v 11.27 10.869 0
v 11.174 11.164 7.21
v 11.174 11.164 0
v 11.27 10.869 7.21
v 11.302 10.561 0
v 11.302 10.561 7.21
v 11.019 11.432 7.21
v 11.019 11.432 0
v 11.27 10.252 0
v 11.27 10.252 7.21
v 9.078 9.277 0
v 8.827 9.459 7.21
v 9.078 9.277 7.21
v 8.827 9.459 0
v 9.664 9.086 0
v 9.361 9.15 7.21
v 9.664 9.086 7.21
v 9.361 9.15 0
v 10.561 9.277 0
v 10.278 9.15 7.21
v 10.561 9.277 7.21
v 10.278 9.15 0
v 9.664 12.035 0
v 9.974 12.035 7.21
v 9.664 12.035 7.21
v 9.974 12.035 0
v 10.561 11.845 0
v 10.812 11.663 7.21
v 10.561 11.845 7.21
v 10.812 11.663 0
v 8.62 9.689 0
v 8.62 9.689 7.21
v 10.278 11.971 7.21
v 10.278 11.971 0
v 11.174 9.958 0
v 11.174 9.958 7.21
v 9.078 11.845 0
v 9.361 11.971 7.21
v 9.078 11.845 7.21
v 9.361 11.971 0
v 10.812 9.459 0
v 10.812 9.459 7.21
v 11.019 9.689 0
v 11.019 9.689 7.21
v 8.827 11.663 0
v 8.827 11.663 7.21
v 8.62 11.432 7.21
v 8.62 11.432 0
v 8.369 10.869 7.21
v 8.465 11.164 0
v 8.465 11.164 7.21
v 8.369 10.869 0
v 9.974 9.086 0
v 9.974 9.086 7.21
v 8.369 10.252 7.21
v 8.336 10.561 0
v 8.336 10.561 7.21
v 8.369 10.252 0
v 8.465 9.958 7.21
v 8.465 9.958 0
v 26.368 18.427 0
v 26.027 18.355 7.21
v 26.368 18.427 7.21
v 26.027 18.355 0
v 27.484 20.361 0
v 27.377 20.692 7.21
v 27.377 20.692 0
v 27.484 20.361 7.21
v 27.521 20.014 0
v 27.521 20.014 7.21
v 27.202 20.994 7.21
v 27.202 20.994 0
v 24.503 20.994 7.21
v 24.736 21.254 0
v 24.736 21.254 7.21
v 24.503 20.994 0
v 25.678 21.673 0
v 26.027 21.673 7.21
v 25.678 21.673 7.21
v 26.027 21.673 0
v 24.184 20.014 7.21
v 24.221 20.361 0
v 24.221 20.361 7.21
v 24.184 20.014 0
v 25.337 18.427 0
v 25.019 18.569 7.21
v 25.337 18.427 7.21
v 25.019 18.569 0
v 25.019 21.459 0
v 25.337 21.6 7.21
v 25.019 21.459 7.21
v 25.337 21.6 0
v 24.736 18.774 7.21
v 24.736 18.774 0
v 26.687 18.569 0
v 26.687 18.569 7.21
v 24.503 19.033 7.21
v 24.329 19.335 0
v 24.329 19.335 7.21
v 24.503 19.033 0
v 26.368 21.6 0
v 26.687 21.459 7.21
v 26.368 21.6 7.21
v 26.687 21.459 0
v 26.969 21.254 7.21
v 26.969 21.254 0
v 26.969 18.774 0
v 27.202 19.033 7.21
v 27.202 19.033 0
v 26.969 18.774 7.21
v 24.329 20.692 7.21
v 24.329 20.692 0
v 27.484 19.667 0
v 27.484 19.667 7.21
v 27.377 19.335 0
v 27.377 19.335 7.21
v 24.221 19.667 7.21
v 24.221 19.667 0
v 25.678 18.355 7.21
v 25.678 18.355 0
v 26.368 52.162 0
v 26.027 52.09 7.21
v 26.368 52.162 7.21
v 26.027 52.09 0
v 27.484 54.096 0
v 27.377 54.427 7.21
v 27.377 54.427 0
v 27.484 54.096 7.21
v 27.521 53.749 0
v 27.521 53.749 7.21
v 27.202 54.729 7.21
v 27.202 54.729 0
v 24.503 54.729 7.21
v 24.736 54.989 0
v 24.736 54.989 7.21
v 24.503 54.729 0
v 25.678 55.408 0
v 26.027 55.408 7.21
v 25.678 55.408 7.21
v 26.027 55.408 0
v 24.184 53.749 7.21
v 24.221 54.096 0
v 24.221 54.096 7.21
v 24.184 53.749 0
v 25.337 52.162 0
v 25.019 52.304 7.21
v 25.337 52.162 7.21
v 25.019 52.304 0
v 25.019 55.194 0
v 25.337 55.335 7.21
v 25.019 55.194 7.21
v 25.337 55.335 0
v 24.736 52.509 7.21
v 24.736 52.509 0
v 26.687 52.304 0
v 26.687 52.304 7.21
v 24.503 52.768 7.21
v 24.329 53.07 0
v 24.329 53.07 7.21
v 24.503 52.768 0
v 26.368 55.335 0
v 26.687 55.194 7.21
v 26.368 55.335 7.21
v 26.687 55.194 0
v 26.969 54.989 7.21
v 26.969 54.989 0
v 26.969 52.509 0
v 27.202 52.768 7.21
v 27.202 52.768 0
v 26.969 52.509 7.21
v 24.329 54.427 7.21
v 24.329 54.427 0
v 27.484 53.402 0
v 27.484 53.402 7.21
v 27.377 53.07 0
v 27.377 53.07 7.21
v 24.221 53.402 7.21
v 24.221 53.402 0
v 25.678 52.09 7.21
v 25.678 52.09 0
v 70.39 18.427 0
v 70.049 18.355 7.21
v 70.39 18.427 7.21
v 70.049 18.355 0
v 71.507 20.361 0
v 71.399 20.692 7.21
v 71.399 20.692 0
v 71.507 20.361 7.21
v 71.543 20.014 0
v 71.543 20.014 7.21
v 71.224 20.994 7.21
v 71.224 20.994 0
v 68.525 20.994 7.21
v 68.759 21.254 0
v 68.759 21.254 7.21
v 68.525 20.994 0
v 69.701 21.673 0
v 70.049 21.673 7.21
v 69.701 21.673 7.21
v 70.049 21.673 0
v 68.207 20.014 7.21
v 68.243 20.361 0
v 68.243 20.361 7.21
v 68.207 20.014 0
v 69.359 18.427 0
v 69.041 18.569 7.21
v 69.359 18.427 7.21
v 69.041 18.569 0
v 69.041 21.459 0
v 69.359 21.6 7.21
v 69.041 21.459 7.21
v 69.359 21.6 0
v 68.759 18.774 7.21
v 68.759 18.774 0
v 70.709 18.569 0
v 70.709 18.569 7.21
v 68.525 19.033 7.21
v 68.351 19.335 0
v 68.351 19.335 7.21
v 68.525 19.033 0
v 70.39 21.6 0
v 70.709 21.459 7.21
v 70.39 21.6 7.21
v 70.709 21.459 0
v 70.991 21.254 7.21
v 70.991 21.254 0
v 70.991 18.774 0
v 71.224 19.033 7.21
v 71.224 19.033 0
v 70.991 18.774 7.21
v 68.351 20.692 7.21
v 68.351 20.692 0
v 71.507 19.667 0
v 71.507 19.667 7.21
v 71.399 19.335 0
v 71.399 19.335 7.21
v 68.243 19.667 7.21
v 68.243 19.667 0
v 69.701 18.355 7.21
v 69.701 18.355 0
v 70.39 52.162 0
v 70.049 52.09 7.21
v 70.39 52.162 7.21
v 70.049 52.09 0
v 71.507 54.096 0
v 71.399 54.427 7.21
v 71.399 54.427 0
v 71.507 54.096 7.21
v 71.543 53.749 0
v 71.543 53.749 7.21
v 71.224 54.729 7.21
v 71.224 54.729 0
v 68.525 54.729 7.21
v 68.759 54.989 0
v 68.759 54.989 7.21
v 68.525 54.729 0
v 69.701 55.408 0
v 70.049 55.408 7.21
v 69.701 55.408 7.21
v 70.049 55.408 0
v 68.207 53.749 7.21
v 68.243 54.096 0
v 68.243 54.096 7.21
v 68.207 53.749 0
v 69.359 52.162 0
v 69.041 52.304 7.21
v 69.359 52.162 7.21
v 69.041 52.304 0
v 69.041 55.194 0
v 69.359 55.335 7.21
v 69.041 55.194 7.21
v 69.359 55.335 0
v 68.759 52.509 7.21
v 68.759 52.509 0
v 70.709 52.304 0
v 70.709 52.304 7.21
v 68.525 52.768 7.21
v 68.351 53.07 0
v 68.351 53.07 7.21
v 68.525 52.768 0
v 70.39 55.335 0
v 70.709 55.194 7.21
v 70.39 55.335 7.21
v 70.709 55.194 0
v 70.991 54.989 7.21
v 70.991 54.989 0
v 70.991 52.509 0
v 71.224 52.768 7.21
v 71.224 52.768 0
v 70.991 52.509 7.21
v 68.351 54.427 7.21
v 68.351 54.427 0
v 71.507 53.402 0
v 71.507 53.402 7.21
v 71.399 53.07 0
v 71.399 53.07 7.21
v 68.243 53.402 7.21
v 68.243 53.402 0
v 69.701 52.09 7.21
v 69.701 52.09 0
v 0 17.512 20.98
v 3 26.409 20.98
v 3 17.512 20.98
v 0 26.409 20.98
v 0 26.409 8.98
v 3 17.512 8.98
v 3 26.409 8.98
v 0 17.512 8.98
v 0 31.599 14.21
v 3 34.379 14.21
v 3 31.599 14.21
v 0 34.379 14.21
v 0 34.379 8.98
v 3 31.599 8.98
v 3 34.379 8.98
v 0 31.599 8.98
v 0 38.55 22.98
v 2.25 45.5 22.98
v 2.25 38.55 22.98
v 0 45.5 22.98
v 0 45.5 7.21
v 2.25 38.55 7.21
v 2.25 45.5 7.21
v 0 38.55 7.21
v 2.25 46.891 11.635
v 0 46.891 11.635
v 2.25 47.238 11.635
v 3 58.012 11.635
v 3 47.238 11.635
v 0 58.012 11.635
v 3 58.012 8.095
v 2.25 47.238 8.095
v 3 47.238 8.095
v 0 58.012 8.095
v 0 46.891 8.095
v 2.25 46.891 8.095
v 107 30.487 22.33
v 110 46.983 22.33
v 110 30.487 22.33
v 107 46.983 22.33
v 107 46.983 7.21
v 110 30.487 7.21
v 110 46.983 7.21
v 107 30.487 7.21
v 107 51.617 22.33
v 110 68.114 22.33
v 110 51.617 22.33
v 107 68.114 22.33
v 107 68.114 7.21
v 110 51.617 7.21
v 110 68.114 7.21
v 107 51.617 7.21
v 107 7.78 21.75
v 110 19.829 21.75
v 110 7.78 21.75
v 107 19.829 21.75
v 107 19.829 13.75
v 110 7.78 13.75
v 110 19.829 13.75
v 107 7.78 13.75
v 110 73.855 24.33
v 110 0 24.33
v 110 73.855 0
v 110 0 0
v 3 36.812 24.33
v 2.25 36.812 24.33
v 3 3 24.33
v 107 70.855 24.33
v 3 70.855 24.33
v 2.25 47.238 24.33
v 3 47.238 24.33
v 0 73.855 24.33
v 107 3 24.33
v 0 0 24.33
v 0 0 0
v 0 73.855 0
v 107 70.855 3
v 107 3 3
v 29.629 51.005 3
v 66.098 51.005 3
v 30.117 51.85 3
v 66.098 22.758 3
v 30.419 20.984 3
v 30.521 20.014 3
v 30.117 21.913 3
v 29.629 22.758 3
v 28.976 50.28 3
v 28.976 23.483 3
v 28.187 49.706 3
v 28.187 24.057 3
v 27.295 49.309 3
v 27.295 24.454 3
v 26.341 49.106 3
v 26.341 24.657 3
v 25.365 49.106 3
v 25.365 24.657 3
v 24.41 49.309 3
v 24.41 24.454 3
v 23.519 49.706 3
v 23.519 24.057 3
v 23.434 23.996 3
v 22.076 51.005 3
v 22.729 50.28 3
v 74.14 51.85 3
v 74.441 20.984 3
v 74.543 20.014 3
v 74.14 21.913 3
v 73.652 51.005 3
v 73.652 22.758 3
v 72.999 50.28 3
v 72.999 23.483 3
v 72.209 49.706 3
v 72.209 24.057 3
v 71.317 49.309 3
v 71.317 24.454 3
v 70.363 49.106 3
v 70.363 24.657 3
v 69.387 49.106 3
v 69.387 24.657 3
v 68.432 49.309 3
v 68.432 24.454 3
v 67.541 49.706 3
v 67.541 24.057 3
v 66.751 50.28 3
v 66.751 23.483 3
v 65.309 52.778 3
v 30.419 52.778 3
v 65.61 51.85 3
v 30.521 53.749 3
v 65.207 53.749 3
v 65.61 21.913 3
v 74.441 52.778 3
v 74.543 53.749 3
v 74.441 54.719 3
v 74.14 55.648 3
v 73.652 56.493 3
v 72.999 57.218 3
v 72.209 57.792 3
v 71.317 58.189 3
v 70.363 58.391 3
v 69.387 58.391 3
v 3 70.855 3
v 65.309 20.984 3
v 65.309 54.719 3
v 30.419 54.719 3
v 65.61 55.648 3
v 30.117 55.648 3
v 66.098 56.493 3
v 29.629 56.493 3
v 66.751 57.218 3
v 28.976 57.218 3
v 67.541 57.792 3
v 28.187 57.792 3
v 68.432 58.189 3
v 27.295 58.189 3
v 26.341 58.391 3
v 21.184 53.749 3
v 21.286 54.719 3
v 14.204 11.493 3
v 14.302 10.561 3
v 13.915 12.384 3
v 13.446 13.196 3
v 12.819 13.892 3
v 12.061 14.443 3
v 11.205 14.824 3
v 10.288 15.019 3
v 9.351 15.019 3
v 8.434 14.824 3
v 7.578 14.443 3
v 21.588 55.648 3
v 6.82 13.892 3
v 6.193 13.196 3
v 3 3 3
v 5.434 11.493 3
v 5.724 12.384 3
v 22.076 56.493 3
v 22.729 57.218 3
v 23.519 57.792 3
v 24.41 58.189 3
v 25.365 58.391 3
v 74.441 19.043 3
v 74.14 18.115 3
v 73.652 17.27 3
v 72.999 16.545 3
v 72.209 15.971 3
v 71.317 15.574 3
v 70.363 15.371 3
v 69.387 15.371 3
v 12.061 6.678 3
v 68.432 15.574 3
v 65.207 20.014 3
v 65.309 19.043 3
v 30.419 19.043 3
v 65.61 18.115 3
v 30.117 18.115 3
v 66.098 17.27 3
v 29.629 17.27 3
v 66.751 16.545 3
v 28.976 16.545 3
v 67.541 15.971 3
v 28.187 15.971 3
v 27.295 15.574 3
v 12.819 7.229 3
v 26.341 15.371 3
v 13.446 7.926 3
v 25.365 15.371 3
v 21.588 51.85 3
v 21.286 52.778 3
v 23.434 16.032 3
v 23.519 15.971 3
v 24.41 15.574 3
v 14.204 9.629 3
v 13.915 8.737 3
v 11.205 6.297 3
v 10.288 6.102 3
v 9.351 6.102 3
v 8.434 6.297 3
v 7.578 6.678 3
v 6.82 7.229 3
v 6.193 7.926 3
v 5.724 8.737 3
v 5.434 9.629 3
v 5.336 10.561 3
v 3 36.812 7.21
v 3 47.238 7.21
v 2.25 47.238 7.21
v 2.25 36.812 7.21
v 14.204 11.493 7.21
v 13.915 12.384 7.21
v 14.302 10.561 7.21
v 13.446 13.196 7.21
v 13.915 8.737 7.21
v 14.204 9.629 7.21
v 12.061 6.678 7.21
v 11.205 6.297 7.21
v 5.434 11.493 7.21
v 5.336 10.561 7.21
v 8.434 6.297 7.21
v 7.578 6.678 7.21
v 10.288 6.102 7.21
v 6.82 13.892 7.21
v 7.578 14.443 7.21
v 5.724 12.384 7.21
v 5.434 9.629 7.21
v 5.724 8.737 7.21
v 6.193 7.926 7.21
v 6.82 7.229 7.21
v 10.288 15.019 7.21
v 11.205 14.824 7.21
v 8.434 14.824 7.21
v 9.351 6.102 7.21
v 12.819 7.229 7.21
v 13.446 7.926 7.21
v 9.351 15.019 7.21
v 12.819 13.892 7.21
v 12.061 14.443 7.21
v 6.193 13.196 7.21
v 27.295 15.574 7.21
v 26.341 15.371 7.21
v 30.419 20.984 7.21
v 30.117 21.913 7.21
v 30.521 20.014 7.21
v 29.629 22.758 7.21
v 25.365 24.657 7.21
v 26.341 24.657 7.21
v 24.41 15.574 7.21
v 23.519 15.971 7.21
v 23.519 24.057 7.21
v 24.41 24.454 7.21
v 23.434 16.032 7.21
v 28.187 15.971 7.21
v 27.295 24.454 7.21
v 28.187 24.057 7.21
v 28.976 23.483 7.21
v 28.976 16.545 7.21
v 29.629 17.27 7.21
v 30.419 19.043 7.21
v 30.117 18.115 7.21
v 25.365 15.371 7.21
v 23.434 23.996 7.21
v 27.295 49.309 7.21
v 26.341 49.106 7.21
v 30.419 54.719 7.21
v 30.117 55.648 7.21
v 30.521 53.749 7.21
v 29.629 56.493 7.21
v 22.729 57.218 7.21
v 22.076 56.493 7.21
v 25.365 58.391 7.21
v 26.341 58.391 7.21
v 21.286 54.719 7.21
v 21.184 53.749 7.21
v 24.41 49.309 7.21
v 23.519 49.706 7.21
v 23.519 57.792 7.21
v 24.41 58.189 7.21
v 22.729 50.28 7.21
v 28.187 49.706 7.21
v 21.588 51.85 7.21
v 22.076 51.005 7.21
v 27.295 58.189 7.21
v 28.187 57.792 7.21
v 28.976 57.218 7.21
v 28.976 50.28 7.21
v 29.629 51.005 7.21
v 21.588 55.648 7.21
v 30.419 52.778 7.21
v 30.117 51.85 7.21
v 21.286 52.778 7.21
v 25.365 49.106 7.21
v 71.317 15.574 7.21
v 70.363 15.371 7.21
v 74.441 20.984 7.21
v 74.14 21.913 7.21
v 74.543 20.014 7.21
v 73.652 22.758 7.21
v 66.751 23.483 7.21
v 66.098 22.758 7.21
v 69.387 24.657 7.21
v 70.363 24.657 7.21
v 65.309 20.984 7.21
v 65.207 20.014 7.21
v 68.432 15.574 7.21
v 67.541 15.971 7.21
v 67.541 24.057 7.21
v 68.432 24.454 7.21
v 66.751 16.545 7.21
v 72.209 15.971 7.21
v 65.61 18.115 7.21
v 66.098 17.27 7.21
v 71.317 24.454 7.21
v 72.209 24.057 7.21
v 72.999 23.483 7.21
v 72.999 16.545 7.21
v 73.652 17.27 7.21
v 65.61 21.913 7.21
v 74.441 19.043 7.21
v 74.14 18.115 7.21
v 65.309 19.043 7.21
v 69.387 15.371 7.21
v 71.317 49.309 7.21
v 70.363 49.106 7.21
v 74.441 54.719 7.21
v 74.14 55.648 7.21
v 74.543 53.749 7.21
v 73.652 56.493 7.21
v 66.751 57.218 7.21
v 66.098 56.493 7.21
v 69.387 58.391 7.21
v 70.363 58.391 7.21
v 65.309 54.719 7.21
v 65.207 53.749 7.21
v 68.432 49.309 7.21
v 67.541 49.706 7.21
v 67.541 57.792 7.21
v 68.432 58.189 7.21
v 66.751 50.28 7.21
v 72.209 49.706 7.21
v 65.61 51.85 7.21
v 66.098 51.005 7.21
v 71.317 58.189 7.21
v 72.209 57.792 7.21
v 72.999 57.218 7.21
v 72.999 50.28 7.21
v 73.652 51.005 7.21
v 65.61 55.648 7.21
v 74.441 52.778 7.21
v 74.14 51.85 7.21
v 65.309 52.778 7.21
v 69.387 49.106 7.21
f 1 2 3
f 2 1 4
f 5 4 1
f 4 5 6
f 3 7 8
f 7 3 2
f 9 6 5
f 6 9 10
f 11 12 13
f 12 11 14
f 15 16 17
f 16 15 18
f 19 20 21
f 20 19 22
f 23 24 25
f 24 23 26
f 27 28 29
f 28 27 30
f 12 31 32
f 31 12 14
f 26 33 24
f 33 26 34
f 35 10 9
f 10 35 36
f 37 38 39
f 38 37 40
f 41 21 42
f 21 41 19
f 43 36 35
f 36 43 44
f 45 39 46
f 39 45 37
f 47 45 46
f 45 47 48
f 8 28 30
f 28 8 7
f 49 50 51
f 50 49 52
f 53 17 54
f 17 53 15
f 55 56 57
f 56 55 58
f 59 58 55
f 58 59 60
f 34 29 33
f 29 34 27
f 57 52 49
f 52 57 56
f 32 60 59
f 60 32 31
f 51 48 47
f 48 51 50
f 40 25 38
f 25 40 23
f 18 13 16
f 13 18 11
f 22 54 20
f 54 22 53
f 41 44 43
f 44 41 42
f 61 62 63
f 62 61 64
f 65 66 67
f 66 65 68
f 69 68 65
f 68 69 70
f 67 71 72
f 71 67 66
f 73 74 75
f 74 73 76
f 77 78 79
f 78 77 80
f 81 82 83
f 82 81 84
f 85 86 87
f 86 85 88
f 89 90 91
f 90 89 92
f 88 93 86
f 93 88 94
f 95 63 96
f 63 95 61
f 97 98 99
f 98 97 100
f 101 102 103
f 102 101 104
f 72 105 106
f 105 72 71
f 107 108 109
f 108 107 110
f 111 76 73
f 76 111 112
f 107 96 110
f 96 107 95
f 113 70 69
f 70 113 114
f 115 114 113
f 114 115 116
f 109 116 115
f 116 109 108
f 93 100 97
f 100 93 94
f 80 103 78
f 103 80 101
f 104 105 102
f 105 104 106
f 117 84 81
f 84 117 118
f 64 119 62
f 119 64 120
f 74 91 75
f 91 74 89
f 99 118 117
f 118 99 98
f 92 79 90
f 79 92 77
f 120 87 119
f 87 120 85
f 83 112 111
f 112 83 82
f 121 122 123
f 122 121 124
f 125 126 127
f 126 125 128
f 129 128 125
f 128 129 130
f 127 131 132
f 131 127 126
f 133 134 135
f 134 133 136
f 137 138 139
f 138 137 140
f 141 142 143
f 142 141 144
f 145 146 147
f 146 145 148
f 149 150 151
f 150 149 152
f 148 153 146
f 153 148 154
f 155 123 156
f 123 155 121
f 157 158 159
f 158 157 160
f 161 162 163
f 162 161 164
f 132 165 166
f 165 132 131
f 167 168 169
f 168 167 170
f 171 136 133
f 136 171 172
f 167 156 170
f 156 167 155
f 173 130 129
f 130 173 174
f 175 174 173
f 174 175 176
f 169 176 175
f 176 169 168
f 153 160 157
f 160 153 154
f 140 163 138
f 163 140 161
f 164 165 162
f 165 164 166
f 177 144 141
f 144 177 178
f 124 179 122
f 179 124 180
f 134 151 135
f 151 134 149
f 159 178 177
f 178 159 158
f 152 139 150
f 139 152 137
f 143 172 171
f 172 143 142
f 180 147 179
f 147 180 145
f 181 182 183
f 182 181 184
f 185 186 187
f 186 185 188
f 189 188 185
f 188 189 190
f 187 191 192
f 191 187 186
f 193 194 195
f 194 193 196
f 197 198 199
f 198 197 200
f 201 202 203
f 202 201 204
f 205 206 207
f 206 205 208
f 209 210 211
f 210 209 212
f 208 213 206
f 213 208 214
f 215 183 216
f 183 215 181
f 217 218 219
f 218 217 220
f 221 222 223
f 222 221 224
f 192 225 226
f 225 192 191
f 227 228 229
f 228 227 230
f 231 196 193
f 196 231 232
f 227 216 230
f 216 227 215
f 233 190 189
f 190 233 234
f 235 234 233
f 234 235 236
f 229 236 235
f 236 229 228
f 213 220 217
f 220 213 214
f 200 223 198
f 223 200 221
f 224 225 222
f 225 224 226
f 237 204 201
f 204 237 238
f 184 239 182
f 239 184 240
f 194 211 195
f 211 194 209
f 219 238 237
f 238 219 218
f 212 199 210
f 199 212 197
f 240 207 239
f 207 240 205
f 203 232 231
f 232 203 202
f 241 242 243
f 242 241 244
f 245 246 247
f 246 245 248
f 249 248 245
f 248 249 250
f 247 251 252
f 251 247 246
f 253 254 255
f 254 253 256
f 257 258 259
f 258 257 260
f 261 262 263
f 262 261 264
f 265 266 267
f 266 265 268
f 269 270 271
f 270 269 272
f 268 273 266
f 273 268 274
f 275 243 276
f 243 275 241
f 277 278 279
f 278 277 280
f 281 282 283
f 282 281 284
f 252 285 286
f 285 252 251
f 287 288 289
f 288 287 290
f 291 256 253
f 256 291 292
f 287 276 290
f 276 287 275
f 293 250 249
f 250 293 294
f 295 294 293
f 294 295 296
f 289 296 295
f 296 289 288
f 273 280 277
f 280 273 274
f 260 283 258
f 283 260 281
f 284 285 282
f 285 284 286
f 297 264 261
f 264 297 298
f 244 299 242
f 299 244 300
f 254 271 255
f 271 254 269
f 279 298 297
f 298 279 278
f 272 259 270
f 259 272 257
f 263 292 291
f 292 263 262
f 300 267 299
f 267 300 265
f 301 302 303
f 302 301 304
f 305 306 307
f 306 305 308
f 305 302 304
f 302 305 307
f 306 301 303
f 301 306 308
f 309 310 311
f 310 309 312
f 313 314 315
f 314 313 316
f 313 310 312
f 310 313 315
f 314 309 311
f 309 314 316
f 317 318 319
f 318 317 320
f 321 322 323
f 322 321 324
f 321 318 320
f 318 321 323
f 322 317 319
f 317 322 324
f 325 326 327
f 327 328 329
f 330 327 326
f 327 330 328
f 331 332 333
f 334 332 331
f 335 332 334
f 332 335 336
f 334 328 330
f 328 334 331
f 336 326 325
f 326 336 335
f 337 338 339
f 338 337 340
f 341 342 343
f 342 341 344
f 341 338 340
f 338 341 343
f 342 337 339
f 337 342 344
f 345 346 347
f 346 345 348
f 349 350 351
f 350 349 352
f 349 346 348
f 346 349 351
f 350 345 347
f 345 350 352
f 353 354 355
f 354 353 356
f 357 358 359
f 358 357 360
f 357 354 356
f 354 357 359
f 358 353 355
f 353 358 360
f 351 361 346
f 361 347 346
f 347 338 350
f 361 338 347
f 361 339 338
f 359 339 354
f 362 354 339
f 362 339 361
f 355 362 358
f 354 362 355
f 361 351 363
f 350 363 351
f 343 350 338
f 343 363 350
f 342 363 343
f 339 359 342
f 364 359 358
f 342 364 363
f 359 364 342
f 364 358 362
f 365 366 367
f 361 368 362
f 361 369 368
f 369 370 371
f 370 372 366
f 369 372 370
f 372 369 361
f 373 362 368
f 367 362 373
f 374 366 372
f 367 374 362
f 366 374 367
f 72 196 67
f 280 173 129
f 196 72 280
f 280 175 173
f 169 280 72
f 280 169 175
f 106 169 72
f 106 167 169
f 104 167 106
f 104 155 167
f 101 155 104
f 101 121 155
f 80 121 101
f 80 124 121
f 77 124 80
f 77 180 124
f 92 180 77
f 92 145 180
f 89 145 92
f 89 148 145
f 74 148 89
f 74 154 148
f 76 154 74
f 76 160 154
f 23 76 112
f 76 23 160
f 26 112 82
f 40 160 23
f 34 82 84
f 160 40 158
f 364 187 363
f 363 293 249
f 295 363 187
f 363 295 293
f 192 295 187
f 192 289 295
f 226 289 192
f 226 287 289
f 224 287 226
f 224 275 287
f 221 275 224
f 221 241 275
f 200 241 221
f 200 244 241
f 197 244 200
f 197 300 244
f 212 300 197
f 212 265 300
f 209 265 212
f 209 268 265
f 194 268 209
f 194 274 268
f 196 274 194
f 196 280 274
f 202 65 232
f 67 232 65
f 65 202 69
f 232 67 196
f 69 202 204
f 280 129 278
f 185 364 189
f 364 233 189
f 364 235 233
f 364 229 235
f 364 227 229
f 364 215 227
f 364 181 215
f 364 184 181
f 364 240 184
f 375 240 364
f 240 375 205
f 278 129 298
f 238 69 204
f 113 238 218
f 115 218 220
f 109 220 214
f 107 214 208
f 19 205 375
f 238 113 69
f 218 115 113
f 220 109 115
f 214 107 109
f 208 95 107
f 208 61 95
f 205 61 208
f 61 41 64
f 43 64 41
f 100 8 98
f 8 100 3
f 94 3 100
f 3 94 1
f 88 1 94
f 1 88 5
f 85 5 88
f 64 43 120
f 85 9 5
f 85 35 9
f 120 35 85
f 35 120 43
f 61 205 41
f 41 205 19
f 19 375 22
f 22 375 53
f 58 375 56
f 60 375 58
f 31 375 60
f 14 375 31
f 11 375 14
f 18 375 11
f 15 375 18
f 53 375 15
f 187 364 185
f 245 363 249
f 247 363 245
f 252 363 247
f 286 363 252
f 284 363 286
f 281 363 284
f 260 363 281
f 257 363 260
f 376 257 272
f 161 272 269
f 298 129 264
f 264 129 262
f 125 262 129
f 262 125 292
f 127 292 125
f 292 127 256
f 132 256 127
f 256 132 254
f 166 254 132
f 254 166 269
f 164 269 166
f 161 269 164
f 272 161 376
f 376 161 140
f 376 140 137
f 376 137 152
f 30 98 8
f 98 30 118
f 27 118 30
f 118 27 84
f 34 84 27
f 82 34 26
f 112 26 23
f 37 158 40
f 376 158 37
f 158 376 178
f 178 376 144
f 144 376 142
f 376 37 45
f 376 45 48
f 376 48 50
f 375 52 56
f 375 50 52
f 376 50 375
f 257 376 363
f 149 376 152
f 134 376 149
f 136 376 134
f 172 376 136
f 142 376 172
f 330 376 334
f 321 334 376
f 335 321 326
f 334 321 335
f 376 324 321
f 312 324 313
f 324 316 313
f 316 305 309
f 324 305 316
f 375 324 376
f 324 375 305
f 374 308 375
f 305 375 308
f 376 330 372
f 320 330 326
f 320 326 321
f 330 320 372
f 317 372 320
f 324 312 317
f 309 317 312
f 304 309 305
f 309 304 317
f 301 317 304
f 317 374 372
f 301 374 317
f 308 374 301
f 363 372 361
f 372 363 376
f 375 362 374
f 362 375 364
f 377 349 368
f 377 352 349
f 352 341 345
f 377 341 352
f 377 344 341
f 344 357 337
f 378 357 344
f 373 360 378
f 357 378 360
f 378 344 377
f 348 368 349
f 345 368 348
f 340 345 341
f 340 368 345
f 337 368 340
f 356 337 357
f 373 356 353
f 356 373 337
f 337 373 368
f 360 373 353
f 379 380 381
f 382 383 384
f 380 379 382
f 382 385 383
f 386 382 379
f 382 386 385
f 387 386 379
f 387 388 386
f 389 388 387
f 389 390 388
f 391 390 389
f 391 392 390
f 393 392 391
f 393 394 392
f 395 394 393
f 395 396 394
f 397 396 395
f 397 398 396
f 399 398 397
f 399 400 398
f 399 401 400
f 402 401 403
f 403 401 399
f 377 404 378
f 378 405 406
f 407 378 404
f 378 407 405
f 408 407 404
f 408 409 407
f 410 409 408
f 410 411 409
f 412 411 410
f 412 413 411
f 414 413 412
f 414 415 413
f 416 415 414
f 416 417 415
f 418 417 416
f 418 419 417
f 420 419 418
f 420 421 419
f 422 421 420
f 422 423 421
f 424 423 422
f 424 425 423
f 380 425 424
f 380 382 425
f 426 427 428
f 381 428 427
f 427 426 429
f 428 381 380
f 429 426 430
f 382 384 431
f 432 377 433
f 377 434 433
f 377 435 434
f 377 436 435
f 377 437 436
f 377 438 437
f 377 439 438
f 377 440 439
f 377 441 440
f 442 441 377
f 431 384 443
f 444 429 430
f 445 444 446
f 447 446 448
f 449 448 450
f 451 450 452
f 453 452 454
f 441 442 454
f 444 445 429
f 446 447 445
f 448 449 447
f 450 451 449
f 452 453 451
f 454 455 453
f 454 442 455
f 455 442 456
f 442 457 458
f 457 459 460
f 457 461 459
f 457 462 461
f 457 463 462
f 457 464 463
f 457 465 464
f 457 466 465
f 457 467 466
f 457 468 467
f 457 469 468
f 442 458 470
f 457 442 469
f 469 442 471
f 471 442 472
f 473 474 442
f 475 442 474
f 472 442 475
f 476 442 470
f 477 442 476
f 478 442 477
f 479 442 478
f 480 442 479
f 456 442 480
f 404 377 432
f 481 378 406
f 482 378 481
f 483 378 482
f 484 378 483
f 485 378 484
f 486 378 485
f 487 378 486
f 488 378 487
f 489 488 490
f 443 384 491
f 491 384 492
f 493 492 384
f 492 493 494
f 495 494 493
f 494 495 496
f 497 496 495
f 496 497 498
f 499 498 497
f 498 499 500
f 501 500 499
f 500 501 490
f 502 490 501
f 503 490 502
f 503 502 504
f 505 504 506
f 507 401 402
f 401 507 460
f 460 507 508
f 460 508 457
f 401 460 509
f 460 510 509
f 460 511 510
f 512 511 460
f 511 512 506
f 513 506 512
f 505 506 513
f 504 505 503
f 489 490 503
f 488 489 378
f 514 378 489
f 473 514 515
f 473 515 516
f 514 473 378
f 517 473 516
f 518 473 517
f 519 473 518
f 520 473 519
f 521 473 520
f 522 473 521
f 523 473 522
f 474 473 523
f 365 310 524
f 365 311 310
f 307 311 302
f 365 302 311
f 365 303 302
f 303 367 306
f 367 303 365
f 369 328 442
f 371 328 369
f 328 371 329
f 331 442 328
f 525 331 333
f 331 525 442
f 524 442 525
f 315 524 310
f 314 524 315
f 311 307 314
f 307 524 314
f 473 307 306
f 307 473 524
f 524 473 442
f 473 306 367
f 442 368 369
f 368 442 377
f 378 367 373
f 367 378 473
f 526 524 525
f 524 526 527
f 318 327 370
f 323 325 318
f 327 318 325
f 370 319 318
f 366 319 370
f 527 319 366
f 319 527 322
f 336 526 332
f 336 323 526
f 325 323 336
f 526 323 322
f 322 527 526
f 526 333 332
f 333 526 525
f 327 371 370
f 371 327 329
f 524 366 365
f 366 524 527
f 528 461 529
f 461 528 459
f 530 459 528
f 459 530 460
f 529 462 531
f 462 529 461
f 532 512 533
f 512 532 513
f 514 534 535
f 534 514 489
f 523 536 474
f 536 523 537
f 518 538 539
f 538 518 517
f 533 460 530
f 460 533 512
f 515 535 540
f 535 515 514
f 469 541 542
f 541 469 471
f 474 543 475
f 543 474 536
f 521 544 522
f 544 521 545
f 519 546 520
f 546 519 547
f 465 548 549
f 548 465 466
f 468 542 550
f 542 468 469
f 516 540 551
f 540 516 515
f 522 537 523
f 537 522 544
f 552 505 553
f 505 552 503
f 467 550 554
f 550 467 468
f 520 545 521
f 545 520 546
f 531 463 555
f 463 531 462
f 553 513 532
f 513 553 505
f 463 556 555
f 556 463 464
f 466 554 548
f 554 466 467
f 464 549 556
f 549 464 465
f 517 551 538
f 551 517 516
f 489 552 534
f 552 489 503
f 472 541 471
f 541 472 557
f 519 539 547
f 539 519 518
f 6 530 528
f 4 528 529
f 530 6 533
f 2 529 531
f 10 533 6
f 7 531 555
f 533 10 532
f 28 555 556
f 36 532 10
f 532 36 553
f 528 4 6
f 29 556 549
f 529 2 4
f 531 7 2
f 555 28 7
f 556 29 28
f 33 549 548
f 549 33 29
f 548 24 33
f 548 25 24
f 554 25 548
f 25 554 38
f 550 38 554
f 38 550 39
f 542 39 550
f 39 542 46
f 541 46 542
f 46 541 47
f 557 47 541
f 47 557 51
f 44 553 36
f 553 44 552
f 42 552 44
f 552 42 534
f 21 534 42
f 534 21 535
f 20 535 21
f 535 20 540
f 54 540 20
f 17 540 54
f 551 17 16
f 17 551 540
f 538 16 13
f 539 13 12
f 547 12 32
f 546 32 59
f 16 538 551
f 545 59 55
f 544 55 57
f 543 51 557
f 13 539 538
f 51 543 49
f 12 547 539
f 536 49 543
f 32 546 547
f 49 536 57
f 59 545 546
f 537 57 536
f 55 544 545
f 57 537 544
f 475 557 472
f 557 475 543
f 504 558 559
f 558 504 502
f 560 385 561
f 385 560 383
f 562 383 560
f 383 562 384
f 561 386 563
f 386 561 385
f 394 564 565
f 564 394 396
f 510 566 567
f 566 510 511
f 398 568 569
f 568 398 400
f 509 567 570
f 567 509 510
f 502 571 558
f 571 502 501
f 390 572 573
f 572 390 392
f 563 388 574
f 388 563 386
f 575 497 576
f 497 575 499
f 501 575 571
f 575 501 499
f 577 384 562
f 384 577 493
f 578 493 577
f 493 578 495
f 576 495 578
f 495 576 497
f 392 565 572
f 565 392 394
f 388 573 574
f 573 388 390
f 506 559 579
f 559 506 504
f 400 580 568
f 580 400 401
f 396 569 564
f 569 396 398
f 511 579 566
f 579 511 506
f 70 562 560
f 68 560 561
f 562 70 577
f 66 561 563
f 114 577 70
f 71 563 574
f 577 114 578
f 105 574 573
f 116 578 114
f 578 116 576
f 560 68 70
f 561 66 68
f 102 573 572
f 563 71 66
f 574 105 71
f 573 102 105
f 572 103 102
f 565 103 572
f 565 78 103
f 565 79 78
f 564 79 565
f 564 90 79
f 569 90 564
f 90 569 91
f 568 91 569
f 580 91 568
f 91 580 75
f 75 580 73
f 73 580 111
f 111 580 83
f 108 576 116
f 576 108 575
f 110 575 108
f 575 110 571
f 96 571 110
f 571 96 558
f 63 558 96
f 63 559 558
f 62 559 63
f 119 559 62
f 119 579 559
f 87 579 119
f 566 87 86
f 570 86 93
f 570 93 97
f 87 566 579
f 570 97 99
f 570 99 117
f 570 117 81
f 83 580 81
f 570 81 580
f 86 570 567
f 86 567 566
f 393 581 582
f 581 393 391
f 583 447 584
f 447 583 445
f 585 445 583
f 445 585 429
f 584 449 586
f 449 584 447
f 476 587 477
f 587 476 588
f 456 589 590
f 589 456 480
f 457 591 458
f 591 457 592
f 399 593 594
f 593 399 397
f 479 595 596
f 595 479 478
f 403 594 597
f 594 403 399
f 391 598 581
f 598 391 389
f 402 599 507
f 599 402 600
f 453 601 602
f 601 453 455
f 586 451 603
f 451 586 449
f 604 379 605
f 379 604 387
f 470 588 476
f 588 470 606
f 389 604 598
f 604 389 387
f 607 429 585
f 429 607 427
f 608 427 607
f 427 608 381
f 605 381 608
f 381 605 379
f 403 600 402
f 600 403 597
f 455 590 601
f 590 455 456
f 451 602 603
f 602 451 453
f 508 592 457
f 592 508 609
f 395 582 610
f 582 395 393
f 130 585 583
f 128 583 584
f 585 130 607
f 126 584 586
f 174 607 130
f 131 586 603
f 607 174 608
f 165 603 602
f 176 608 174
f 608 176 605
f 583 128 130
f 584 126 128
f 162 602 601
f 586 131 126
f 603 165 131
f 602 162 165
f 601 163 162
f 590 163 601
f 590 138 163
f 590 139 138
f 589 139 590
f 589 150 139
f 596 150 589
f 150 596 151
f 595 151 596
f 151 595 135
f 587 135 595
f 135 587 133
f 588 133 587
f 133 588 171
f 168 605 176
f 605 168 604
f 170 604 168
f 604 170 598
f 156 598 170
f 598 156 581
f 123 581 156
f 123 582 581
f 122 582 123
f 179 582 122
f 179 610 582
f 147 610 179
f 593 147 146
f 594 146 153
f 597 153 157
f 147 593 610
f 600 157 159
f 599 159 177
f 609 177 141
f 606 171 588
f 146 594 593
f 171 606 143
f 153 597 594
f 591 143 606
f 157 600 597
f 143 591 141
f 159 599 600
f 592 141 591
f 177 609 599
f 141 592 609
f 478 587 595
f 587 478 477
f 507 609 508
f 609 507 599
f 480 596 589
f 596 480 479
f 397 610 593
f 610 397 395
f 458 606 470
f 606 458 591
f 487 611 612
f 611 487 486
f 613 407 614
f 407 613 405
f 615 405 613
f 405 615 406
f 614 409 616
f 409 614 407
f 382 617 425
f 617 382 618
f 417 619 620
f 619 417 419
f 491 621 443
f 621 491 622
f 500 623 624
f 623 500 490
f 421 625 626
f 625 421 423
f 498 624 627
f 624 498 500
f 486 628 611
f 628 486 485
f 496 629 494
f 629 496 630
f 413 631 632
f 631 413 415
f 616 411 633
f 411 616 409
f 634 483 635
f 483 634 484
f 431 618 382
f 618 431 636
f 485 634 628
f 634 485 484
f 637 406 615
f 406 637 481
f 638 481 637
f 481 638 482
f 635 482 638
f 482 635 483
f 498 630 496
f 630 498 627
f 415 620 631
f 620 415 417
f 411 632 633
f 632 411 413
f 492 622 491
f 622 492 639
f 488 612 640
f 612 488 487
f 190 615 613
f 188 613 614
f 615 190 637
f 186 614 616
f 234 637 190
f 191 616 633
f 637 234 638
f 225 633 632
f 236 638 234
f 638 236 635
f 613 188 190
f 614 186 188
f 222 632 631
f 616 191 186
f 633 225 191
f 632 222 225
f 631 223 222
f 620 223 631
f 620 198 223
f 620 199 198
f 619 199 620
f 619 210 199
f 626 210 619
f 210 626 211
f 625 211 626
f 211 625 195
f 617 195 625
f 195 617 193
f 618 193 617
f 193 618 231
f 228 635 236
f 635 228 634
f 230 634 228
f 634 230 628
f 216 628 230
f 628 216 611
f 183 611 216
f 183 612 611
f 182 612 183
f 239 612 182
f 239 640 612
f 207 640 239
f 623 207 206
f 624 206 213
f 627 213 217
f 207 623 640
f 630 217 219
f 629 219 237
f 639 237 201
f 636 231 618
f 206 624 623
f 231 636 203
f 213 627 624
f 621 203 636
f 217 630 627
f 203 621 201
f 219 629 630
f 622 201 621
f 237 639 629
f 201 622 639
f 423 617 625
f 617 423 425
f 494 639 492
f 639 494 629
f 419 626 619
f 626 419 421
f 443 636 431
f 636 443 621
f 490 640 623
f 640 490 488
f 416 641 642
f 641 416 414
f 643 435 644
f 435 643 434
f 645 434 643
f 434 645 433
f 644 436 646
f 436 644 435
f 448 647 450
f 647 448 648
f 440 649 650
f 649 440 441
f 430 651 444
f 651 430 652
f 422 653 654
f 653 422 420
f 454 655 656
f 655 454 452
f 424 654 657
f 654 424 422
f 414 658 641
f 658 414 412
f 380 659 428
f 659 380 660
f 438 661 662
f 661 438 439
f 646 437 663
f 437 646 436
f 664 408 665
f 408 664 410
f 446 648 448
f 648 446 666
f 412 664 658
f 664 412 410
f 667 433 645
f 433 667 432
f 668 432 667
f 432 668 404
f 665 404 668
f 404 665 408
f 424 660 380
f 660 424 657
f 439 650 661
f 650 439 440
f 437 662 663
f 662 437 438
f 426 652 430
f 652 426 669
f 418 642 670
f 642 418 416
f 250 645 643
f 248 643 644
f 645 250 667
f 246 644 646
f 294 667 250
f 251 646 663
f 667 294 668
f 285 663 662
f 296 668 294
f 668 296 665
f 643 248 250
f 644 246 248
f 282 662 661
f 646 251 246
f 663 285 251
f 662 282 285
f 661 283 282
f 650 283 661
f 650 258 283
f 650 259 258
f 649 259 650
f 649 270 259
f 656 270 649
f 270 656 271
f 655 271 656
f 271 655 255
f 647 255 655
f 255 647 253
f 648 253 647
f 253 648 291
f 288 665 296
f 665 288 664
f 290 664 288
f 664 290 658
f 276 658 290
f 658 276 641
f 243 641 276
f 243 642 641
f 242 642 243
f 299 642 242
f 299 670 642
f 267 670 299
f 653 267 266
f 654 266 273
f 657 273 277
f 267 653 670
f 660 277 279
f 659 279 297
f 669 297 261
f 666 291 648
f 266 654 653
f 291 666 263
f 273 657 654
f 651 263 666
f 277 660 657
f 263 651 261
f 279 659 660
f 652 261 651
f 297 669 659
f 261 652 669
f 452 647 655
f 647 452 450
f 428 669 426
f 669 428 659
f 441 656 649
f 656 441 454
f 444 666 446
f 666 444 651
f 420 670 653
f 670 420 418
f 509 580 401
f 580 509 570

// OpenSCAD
phy_div = 10.79;

width= 1079; // 100 mm
depth = 689; // 64.61 mm
height = 1.77 * phy_div; // 1.77 mm

unit_height = 15.5 * phy_div;
unit_bottom_gap = 4.21 * phy_div;

clearance = 2 * phy_div;
wall = 3 * phy_div;

edge_screw_radius = 32 / 2;
screw_0x = 68 - edge_screw_radius;
screw_0z = 76 - edge_screw_radius;

screw_radius = 36 / 2;
screw_1x = 243 - screw_radius;
screw_1z = 180 - screw_radius;

screw_2x = screw_1x;
screw_2z = 544 - screw_radius;

screw_3x = 718 - screw_radius;
screw_3z = screw_1z;

screw_4x = screw_3x;
screw_4z = screw_2z;

gap_barrel = 96;
gap_reset = 30;
gap_usb = 75;
gap_card = 120;
gap_eth = 178;
gap_serial = 130;

barrel_y = 12 * phy_div + height;
barrel_z = 135;
reset_y = 7 * phy_div;
reset_z = 287;
usb_y = 14 * phy_div + height;
usb_z = 362;
card_y = 2 * height;
card_z = 452;
eth_y = 13.35 * phy_div + height;
eth0_z = 275;
eth1_z = 503;
serial_z = 30;
serial_y1 = 12.77 * phy_div + height;
serial_y0 = serial_y1 - 8 * phy_div;

max_y = eth_y;

module hole(x,y,r,h) translate([x, y, -1]) cylinder(h + 2, r, r);

module holes(h = height, radius_more = 0) {
    hole(screw_0x, screw_0z, edge_screw_radius + radius_more, h);
    hole(screw_1x, screw_1z, screw_radius + radius_more, h);
    hole(screw_2x, screw_2z, screw_radius + radius_more, h);
    hole(screw_3x, screw_3z, screw_radius + radius_more, h);
    hole(screw_4x, screw_4z, screw_radius + radius_more, h);
}

module post() {
    translate([0, 0, 1])
        difference() {
            holes(unit_bottom_gap + wall - 2, wall);
            scale([1, 1, 10]) 
                translate([0, 0, -unit_bottom_gap / 2]) 
                    holes(unit_bottom_gap + wall);
        }
}

module baseboard()
    color("green")
    difference() {
        cube([width, depth, height], center = false);
        holes();
    }

module chassis_bottom() {
    chassis_clearance = 2 * clearance + 2 * wall;
        
    difference() {
        cube([
            width + chassis_clearance,
            depth + chassis_clearance,
            wall + unit_bottom_gap + max_y + clearance], center = false);
        
        translate([wall + clearance, wall + clearance, 0]) 
            scale([1, 1, 10]) 
                translate([0, 0, -unit_bottom_gap / 2]) 
                    holes(unit_bottom_gap + wall);
        
        translate([wall, wall, wall]) 
            cube([
                width + 2 * clearance,
                depth + 2 * clearance,
                wall + unit_bottom_gap + max_y + clearance], center = false);
        
        translate([-10, wall + clearance, wall + unit_bottom_gap]) union() {
            translate([0, barrel_z, height]) cube([100,gap_barrel,barrel_y - height]);
            translate([0, reset_z, height]) cube([100,gap_reset,reset_y - height]);
            translate([0, usb_z, 0]) cube([100,gap_usb,usb_y]);
            translate([0, card_z, height / 2]) cube([100,gap_card,card_y]);
        };
        
        translate([wall * 0.75, wall + clearance, wall + unit_bottom_gap]) union()
            translate([0, usb_z - (gap_usb / 4), 0])
            cube([100, gap_usb * 1.5, usb_y*10]);
        
        translate([width + chassis_clearance - wall - 10, wall + clearance, wall + unit_bottom_gap]) union() {
            translate([0, eth0_z, 0]) cube([100,gap_eth,eth_y]);
            translate([0, eth1_z, 0]) cube([100,gap_eth,eth_y]);
            translate([0, serial_z, serial_y0]) cube([100,gap_serial,serial_y1 - serial_y0]);
        };
        
        //*
        translate([50, 10, 50])
            scale([1,10,1])
            rotate([90,0,0])    
            linear_extrude( 3.6)
            projection(cut = true)
            translate ([0,0,70])
            surface(file = "hastlayer-logo-tagline-120h.png", center = false, invert = true);
        // */
    }
}

scale(1 / phy_div) 
    union() {
        //translate([wall + clearance, wall + clearance, wall + unit_bottom_gap]) baseboard();
        chassis_bottom();
        difference() {
            translate([wall + clearance, wall + clearance, 0]) post();
            
            // Cutoff for an underside capacitor.
            // Board coordinates.
            translate([wall + clearance, wall + clearance, wall]) 
                // Bottom left of the #1 post.
                translate([screw_1x - screw_radius - wall, screw_1z - screw_radius - wall, 0])
                cube([0.75 * wall, 2 * wall + 2 * screw_radius, 1000]);
        }
    }
